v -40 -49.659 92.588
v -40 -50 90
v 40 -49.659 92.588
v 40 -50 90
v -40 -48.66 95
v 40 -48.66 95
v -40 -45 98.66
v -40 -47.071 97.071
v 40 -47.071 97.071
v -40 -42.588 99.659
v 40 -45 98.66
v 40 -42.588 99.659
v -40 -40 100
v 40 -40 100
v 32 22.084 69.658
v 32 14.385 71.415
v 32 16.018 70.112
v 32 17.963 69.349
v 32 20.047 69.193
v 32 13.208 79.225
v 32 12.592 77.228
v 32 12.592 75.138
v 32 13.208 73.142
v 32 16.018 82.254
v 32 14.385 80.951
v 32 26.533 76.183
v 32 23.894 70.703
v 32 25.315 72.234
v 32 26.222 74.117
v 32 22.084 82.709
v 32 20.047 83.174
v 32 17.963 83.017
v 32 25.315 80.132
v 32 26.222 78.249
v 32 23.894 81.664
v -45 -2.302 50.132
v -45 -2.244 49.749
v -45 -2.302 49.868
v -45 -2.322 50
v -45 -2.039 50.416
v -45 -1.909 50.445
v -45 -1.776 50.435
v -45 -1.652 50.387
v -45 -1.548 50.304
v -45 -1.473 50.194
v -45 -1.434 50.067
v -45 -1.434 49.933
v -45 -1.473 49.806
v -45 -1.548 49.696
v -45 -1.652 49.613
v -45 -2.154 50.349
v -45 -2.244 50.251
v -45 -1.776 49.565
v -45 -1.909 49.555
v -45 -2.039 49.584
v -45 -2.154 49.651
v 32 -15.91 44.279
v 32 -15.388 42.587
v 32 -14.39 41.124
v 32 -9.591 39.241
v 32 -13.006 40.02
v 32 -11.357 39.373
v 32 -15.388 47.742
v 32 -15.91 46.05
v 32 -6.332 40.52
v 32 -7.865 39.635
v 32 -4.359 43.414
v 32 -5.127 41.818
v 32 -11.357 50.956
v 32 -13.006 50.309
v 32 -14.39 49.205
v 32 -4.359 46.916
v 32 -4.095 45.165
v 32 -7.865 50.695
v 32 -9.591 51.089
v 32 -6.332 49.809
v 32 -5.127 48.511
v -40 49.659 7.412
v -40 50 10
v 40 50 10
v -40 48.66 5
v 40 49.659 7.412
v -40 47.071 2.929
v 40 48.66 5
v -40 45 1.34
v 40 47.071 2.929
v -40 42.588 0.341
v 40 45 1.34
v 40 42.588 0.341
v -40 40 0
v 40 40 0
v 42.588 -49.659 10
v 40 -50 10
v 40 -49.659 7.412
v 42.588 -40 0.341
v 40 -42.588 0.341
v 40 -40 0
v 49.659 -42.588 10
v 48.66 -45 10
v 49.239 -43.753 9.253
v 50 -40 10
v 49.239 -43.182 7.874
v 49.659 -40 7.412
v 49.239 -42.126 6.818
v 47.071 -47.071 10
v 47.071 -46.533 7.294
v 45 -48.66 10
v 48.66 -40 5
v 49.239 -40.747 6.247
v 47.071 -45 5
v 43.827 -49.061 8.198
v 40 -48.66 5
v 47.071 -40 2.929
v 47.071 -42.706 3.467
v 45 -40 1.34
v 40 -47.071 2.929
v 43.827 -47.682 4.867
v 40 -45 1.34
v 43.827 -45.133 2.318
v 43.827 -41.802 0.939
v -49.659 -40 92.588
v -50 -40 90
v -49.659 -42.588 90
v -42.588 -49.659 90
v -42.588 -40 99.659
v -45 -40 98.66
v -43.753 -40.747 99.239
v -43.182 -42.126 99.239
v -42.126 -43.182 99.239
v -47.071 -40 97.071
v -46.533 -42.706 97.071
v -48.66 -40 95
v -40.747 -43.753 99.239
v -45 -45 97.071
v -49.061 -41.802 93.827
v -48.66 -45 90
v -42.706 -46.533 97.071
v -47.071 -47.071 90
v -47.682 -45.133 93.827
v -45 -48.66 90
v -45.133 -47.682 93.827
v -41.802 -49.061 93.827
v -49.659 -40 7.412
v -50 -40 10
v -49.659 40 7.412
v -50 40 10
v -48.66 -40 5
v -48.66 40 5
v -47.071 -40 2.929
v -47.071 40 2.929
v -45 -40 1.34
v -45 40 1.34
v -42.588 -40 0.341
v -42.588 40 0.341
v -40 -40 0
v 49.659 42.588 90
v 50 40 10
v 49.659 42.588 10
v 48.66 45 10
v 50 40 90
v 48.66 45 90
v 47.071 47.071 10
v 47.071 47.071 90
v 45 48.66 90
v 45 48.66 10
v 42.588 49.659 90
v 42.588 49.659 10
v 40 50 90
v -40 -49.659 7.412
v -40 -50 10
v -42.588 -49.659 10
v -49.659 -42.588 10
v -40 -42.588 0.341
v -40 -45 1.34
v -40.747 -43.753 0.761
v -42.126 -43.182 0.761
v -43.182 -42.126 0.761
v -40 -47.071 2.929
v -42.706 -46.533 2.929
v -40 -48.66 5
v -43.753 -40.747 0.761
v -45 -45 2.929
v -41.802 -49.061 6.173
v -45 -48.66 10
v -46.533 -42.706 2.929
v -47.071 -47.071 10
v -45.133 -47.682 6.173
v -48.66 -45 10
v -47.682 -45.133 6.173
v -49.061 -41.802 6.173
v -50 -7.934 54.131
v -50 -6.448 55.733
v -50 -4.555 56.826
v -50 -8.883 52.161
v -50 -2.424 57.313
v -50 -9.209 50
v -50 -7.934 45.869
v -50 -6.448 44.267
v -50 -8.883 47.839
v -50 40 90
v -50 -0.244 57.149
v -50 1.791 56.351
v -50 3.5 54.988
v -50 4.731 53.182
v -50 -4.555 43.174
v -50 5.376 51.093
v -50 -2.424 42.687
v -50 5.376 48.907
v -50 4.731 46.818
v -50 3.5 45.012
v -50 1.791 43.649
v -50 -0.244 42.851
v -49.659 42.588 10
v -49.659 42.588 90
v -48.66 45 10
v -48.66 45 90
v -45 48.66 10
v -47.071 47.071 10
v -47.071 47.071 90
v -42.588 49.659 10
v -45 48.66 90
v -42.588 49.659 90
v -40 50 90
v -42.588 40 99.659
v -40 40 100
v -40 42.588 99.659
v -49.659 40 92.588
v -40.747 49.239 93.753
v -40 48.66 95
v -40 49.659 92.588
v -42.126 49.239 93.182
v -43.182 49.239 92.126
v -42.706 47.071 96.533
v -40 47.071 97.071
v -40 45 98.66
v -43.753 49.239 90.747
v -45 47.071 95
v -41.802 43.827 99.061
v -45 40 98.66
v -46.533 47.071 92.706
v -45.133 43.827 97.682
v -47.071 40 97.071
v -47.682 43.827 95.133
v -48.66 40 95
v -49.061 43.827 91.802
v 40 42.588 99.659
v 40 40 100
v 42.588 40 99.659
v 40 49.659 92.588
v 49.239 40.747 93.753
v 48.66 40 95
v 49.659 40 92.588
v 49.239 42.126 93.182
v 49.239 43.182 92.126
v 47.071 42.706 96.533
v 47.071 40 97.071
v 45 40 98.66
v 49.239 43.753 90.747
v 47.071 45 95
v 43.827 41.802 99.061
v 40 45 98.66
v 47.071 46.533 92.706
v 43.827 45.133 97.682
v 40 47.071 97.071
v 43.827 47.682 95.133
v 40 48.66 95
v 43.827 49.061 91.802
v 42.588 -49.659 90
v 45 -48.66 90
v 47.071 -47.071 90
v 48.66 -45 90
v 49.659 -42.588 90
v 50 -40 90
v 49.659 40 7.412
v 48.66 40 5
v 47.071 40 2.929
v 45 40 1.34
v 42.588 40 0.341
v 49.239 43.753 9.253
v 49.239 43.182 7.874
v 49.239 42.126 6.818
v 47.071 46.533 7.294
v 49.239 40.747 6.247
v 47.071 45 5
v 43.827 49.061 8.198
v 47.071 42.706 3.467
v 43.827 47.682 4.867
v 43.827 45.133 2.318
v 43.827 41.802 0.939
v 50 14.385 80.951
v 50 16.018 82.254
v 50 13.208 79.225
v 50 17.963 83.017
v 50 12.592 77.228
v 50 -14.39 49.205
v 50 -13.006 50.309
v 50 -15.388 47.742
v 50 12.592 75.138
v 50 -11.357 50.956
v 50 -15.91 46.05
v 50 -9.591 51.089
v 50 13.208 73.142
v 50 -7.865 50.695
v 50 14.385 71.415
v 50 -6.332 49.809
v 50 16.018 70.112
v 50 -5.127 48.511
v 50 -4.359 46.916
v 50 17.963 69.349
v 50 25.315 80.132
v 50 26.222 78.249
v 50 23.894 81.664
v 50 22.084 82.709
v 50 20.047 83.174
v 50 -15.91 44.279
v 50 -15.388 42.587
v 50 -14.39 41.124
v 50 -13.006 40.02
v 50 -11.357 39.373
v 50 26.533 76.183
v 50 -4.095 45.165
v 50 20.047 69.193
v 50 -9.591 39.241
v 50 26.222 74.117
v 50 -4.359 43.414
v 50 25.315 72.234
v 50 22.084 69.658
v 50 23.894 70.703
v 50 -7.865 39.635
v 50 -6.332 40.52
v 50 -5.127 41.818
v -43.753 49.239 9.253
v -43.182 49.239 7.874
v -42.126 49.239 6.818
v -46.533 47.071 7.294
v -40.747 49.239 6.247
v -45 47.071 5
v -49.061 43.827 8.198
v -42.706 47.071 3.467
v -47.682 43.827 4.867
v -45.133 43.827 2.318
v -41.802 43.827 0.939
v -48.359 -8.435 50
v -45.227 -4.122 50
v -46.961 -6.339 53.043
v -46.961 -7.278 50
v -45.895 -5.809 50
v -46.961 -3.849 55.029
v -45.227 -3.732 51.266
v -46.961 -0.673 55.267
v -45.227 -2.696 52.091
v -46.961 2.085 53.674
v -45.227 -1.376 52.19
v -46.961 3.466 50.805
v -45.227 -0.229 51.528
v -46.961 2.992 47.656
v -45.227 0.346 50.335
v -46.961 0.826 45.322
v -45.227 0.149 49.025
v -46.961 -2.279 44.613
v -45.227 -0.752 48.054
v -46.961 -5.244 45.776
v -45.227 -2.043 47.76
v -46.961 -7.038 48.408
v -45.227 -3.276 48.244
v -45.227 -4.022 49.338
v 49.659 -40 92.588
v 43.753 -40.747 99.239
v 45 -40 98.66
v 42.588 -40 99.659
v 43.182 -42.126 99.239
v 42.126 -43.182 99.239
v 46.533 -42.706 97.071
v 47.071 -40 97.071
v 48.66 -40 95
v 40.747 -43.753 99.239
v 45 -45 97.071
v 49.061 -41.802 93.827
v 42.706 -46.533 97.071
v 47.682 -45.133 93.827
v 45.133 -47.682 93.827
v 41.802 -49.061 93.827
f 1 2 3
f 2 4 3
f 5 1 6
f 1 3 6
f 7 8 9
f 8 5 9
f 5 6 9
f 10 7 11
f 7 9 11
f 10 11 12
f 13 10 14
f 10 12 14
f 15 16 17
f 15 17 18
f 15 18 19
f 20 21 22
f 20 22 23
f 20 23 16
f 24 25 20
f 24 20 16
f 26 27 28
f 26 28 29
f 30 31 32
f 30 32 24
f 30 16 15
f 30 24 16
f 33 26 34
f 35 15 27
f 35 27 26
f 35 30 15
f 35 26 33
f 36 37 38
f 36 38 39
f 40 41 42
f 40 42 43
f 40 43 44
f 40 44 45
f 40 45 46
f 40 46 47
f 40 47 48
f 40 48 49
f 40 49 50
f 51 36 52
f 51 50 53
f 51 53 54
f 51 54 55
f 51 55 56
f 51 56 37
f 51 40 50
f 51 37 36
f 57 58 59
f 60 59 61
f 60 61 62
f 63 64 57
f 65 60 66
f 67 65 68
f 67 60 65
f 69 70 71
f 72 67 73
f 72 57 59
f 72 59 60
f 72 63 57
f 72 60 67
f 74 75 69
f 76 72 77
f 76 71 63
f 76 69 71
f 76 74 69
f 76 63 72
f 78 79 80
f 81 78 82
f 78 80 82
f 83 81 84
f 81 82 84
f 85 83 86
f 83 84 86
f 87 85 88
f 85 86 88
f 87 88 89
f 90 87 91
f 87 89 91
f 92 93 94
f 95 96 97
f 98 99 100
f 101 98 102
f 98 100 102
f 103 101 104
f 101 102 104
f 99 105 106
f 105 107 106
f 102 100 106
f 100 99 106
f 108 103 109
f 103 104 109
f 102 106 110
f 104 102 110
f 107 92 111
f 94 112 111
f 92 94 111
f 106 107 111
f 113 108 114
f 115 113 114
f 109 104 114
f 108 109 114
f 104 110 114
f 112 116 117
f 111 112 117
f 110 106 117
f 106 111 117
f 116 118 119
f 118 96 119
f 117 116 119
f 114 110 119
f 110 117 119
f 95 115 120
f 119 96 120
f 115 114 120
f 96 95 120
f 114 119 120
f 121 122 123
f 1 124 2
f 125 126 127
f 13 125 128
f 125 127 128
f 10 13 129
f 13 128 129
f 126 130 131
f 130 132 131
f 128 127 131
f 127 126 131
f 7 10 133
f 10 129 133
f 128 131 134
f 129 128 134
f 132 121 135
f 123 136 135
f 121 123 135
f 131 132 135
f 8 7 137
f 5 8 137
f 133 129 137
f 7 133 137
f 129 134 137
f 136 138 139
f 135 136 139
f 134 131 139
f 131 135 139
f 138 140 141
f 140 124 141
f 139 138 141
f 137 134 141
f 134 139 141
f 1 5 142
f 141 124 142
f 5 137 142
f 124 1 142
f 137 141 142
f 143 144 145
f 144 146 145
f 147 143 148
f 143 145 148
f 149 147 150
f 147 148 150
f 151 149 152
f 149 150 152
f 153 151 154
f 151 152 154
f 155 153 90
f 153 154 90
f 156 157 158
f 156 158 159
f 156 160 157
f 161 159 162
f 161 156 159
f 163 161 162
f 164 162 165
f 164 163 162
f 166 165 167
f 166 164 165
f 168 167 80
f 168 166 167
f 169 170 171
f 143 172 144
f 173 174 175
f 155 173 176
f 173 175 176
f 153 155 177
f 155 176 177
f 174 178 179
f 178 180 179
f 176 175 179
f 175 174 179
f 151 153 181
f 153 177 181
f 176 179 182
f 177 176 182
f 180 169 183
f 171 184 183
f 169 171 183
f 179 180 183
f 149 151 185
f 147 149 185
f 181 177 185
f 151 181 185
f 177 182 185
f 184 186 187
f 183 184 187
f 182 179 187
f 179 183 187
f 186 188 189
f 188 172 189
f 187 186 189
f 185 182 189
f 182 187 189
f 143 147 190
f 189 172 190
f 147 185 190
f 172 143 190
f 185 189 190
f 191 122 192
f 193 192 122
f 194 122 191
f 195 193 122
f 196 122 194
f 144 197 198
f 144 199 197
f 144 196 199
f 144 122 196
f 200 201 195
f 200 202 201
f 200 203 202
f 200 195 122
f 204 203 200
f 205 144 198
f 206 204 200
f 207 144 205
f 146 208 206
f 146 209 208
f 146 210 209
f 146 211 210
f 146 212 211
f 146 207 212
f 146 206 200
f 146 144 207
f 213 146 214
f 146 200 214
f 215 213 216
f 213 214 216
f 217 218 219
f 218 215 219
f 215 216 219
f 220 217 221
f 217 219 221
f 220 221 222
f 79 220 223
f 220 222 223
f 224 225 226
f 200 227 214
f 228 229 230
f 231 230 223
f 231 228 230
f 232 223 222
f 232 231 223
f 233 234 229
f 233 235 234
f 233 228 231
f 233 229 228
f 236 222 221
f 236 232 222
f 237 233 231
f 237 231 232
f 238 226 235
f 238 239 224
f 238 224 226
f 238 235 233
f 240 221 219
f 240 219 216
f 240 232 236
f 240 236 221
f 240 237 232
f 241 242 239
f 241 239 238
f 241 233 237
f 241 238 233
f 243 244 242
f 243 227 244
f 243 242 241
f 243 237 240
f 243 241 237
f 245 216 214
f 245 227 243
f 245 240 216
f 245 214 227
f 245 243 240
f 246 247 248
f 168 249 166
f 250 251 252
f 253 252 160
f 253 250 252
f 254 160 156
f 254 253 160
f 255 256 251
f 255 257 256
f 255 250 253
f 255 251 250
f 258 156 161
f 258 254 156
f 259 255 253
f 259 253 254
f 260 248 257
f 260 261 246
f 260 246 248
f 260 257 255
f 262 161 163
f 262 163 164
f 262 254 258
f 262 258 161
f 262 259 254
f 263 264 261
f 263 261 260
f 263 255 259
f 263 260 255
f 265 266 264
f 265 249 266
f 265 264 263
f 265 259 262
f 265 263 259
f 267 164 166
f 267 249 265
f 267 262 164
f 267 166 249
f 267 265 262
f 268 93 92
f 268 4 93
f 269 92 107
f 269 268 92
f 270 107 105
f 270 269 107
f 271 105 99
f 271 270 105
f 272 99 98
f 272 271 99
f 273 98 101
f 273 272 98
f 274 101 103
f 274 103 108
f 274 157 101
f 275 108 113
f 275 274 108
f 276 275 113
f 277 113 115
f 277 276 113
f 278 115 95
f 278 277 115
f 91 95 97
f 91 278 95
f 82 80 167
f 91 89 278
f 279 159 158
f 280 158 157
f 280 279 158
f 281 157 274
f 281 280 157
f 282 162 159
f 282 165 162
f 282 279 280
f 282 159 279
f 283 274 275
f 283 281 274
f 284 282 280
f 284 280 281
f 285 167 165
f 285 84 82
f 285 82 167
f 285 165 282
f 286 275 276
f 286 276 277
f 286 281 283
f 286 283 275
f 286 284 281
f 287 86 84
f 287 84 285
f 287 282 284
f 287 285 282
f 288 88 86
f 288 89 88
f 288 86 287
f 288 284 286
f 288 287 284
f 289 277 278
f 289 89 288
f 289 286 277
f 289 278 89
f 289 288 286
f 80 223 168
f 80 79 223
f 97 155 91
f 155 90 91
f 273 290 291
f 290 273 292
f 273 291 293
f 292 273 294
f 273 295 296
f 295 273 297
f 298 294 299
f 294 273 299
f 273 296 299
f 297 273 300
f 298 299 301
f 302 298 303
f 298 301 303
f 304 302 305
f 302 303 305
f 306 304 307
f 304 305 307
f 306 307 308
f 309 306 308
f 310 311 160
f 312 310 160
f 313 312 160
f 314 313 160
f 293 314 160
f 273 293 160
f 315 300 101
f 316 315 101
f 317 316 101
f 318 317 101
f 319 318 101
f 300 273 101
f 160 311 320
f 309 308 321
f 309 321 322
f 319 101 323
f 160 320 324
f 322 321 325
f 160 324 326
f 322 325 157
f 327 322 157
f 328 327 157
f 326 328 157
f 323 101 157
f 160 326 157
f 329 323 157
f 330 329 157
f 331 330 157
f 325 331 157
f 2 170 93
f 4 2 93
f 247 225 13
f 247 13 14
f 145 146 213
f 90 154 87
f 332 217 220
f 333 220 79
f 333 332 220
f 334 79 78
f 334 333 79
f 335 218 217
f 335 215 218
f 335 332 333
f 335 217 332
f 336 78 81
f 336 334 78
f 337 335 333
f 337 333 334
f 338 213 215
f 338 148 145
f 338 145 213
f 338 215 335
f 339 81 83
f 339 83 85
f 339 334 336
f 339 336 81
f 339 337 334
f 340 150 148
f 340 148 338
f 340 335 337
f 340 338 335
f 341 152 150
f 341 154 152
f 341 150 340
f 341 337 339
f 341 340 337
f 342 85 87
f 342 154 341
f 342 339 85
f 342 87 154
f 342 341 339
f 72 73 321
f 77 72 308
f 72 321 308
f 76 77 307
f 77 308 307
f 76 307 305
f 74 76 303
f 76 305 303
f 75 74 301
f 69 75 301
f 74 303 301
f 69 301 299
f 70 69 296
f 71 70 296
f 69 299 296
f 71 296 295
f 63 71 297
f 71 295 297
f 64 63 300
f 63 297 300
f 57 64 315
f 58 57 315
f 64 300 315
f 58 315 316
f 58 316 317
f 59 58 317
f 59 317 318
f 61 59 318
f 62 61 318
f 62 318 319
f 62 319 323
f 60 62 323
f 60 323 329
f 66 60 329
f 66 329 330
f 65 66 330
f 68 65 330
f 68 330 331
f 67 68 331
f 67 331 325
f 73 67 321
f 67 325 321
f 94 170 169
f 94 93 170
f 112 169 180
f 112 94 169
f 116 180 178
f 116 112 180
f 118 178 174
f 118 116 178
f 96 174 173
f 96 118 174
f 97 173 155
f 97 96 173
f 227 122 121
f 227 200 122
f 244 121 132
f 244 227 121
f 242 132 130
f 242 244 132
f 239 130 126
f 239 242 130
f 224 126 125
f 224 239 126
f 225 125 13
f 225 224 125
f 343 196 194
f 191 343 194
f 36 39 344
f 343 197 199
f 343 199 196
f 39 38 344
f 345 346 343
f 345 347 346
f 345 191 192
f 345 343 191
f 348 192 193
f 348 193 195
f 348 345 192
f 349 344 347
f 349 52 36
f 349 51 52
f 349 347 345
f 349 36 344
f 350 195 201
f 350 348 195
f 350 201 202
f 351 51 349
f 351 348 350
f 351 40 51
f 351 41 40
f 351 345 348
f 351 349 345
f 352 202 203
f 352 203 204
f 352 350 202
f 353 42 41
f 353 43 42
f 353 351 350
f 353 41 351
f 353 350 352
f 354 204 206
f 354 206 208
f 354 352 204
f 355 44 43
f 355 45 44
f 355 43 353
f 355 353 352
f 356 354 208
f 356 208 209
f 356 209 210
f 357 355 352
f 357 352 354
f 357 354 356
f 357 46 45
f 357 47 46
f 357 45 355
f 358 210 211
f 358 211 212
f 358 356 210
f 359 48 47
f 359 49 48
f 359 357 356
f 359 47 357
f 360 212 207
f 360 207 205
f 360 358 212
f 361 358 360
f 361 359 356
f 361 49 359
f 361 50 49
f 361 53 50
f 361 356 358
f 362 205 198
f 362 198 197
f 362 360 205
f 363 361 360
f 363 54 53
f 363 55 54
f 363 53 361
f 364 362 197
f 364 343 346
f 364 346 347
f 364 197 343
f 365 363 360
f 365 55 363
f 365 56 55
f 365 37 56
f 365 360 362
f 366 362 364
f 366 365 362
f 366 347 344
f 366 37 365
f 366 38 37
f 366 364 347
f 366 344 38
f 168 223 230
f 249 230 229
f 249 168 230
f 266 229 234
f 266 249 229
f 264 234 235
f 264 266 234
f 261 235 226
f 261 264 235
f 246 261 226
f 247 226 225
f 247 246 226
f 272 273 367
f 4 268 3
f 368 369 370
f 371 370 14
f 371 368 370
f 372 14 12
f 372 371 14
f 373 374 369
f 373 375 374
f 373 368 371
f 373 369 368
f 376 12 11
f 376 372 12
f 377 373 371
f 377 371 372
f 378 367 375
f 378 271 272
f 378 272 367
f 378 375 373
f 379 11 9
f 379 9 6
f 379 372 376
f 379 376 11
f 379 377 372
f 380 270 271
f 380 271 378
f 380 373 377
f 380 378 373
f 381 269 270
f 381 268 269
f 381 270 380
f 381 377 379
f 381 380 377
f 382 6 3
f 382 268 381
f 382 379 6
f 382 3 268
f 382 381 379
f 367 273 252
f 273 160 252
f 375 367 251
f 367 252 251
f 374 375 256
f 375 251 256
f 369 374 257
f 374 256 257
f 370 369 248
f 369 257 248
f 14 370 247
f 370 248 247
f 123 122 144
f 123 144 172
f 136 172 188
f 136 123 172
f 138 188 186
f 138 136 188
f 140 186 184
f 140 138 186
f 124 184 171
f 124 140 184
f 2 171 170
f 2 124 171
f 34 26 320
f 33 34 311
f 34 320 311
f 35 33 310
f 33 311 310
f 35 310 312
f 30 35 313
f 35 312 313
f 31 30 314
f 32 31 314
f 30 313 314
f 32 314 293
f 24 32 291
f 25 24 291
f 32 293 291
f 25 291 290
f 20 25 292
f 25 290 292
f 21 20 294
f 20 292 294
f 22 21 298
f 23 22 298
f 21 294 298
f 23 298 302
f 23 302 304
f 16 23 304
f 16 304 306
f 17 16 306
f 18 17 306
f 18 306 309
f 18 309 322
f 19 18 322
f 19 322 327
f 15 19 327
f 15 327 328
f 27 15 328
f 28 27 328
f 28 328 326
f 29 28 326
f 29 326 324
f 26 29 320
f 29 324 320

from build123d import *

# Parameters (mm, degrees)
F0_W     = 100
F0_H     = 100
F1_DEPTH = 100
F2_R     = 10
F3_R     = 7.3330548606
F4_DEPTH = 5
F5_R     = 7.0099311872
F5_R_2   = 5.9405048223
F6_DEPTH = 18


# Not quite as in the source:
# - a fillet or chamfer that OpenCascade refuses, or shapes differently, is made with other operations: its cross-section is extruded or revolved along the edge and cut away or added


with BuildPart() as f1:
    # F0 (on Top) → F1 (new body)
    with BuildSketch(Plane.XY):
        Rectangle(F0_W, F0_H)
    extrude(amount=F1_DEPTH)

    # F2
    f2_edges = [f1.edges().sort_by_distance(p)[0] for p in [
        (-50, -50, 50),
        (0, -50, 0),
        (50, -50, 50),
        (-50, 0, 100),
        (0, 50, 100),
        (50, 0, 100),
        (0, -50, 100),
        (-50, 0, 0),
        (-50, 50, 50),
        (0, 50, 0),
        (50, 50, 50),
        (50, 0, 0),
    ]]
    fillet(f2_edges, radius=F2_R)

    # F3 (on face) → F4 (cut)
    with BuildSketch(Plane(origin=(-50, 0, 0), x_dir=(0, -1, 0), z_dir=(-1, 0, 0))):
        with Locations((1.8755461788, 50)):
            Circle(F3_R)
    extrude(amount=-F4_DEPTH, mode=Mode.SUBTRACT)

    # F5 (on face) → F6 (cut)
    with BuildSketch(Plane.YZ.offset(50)):
        with Locations((19.523344934, 76.1831775308)):
            Circle(F5_R)
        with Locations((-10.0353639573, 45.1647788286)):
            Circle(F5_R_2)
    extrude(amount=-F6_DEPTH, mode=Mode.SUBTRACT)

    # F7: fillet of radius 7.2426406871 on 5 edges, made by hand

    # F7_s1 → F7_t2 (revolve)
    with BuildSketch(Plane.XY.offset(50)):
        with BuildLine():
            ThreePointArc((-50, -9.2086010394), (-46.3818180141, -6.5771030138), (-45, -2.3219177396))
            Line((-45, -2.3219177396), (-45, -9.2086010394))
            Line((-45, -9.2086010394), (-50, -9.2086010394))
        make_face()
    revolve(axis=Axis((-45, -1.8755461788, 50), (-1, 0, 0)))


solid = f1.part
